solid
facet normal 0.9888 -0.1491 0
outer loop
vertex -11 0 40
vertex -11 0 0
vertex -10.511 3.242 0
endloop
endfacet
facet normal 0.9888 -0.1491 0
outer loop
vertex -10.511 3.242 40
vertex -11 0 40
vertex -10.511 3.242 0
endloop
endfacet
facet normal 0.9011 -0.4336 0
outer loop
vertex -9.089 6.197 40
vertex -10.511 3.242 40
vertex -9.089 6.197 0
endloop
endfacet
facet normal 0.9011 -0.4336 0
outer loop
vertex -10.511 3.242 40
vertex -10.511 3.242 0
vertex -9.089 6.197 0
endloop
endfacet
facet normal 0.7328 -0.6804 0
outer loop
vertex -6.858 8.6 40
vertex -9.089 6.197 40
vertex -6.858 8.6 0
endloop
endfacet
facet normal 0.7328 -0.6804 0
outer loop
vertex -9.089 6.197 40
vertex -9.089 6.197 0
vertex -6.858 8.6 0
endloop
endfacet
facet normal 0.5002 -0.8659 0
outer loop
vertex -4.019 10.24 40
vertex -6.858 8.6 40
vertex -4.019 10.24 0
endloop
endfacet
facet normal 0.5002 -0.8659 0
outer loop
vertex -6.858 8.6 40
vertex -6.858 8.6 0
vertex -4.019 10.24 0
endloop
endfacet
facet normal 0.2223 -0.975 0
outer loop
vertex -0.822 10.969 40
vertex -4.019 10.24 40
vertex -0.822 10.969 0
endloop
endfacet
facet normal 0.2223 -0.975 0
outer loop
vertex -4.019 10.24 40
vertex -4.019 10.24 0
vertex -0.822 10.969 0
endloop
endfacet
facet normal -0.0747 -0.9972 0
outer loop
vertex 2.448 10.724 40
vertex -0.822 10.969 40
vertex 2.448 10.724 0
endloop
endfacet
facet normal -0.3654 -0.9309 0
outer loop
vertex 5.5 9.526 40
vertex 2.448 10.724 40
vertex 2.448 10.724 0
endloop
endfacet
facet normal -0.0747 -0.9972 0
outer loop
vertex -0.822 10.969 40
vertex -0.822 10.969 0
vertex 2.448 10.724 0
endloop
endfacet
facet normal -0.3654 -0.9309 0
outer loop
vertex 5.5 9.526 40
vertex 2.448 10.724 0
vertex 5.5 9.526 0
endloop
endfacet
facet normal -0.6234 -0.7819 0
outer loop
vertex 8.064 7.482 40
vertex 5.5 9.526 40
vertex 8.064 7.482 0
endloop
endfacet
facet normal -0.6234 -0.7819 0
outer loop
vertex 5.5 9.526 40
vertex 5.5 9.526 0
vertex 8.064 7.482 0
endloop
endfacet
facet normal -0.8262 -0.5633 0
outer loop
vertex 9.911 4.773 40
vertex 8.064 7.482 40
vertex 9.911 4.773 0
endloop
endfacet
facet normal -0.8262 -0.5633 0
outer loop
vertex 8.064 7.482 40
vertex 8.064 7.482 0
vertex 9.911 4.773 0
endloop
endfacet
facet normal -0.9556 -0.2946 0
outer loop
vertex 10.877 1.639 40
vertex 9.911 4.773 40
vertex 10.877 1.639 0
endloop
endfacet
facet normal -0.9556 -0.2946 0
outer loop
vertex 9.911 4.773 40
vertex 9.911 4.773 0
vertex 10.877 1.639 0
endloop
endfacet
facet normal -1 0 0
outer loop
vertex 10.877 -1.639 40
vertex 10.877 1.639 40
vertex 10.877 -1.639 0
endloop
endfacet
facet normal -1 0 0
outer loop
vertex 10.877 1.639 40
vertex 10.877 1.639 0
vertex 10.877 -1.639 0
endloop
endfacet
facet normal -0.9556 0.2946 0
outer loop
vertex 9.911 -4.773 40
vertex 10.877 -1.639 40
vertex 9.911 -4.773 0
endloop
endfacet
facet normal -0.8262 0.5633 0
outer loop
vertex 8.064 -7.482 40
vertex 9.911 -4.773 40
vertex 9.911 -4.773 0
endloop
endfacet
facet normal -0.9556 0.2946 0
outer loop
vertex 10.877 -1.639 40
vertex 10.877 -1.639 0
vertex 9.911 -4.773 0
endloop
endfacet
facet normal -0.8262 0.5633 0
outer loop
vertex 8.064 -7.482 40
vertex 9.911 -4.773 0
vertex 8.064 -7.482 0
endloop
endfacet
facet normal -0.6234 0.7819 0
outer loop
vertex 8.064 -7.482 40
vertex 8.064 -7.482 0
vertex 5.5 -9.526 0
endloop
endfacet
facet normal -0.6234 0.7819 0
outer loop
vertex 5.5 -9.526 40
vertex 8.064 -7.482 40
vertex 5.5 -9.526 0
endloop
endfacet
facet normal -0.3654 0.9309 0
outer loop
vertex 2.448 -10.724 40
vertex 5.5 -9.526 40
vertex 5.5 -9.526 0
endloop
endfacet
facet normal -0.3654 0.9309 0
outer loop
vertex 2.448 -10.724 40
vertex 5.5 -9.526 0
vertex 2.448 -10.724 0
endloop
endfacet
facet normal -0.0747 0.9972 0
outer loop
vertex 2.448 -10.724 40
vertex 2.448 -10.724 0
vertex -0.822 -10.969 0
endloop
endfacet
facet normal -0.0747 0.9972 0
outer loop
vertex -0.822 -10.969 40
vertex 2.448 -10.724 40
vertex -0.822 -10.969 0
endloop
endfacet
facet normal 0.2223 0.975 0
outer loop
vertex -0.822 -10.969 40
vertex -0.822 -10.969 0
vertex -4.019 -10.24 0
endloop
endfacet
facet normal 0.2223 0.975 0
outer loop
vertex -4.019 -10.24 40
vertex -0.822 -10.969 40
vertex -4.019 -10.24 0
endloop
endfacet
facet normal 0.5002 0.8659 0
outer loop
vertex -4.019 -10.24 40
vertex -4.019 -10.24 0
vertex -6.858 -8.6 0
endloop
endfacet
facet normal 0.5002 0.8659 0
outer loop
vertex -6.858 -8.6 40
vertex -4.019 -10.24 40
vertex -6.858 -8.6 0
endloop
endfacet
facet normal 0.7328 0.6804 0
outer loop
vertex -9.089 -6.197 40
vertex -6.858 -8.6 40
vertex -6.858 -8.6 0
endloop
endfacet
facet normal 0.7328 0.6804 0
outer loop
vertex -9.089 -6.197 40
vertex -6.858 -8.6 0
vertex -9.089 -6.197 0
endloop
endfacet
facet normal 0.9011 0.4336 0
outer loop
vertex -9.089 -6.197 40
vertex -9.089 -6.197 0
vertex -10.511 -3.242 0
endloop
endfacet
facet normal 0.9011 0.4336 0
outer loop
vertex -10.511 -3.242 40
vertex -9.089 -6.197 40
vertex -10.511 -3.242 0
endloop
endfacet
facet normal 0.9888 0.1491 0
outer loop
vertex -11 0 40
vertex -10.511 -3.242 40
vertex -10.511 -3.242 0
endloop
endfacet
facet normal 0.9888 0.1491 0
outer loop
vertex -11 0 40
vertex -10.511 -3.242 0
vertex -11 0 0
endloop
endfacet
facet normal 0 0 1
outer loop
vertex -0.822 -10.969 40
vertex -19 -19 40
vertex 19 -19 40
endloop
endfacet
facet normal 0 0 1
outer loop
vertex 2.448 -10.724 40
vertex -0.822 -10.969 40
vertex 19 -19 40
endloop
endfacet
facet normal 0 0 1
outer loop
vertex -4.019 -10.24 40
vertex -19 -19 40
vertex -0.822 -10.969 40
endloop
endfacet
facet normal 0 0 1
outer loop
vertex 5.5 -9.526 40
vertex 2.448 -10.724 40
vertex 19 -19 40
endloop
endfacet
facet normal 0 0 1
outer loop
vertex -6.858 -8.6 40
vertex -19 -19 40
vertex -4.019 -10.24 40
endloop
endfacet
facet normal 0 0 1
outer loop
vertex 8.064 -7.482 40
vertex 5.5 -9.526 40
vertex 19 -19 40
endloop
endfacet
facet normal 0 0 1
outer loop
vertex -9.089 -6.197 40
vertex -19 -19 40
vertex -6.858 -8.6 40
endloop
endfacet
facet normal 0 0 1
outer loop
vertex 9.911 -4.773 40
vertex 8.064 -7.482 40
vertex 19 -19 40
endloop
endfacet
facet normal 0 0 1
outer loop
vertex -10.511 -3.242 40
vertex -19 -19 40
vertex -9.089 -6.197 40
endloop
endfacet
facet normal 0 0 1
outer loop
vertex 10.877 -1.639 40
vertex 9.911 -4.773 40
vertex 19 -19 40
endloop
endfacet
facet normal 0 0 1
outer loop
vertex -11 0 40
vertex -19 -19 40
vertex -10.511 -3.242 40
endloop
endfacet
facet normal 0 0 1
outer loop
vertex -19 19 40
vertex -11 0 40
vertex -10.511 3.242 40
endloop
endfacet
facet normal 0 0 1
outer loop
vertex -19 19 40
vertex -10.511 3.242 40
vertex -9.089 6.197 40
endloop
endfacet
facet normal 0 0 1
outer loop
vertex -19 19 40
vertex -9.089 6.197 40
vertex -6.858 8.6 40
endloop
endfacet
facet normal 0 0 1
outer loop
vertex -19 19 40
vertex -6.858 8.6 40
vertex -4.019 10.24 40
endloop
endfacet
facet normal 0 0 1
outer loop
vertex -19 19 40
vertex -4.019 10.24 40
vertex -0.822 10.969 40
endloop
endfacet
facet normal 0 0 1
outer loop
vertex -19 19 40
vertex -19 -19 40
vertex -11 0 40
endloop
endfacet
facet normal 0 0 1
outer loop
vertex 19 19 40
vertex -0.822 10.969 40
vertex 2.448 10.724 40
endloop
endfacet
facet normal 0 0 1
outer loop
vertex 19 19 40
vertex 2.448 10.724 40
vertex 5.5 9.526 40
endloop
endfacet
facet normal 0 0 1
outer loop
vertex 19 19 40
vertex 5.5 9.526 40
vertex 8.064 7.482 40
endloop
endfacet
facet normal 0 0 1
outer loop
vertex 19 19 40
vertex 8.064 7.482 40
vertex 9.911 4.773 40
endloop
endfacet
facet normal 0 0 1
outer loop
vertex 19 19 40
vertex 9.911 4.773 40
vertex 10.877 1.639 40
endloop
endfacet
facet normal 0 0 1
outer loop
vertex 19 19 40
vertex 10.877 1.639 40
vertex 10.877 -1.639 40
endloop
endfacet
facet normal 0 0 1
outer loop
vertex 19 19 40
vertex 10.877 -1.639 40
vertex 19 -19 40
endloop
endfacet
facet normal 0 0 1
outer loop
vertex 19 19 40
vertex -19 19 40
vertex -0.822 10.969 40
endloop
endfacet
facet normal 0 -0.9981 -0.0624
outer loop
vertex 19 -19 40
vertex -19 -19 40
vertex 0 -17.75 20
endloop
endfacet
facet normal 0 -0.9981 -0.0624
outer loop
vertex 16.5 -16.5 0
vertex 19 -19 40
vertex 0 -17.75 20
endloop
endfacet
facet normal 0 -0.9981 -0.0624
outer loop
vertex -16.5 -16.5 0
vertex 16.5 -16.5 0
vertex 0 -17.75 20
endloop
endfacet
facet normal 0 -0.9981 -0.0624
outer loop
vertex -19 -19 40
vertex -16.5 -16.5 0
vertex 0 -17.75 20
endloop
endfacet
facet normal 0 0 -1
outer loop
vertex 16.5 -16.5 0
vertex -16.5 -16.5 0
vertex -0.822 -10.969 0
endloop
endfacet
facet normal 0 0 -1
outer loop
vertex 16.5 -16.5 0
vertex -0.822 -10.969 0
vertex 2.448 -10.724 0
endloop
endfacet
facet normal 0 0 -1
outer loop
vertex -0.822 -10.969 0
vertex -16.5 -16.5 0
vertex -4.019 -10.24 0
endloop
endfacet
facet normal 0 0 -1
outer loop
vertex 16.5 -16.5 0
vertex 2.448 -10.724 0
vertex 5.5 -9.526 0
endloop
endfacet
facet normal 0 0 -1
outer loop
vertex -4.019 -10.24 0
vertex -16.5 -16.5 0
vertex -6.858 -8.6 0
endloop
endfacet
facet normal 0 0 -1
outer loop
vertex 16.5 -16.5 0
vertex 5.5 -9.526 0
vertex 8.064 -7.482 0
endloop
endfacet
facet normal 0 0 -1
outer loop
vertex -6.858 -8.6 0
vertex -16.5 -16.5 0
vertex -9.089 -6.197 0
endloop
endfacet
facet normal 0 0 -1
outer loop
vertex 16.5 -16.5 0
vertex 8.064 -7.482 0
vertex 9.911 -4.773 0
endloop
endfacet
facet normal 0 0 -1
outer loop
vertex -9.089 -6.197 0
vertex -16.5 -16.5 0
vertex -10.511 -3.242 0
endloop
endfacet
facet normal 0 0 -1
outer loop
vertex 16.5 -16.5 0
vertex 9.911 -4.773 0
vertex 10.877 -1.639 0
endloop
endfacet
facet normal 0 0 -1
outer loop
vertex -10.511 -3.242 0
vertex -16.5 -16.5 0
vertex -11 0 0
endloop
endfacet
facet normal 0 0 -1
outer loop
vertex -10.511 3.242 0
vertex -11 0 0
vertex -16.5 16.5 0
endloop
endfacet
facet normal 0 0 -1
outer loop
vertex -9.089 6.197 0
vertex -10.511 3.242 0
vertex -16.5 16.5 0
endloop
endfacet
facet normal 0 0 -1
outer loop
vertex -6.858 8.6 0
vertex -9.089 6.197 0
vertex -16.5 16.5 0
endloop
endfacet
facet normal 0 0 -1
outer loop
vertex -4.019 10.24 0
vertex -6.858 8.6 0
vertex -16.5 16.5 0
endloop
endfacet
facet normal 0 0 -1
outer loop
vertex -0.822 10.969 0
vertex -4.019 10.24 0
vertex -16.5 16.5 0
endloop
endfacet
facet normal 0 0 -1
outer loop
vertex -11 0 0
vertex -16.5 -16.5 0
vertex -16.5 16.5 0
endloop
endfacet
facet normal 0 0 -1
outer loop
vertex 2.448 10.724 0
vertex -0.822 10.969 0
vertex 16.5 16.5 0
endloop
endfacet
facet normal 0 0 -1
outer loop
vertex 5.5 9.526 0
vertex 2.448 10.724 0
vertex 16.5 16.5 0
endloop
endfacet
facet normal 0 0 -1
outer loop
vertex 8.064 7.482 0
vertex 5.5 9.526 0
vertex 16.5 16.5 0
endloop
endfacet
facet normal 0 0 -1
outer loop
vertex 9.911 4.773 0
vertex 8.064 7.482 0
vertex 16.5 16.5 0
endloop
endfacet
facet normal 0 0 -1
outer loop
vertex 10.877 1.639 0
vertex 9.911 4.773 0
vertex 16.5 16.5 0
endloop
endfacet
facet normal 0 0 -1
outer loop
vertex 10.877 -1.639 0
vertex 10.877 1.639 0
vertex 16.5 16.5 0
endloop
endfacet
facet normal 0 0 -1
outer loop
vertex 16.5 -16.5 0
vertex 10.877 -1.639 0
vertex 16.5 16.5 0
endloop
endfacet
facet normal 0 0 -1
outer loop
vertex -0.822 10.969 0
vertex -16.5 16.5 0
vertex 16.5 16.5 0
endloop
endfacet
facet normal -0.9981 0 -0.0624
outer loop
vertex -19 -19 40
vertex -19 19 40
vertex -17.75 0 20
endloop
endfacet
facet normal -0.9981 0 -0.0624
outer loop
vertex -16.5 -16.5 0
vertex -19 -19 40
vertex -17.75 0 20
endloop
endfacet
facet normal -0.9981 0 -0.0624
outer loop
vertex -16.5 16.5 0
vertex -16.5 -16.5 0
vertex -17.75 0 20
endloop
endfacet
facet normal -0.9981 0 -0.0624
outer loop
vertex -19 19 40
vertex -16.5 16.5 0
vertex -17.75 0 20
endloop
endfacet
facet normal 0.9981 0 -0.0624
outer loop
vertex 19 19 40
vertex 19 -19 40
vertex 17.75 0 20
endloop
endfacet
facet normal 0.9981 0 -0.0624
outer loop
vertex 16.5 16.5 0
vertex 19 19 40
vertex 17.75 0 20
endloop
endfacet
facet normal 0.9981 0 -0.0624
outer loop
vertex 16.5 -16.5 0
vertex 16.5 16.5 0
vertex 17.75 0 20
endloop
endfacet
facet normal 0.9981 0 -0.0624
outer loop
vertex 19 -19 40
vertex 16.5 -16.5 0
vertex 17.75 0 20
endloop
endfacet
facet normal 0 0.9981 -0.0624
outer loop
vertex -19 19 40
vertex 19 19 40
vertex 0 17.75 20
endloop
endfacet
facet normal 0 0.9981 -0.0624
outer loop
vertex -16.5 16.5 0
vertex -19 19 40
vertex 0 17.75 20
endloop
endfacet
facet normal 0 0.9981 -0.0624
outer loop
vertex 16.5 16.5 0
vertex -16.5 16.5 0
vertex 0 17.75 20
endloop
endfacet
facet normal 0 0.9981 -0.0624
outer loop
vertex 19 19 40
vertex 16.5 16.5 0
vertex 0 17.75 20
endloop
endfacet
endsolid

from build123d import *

# Parameters (mm, degrees)
F2_W = 38
F2_H = 38
F0_W = 33
F0_H = 33
F5_D = 22


with BuildPart() as f3:
    # F2 (on offset) → F3 section 0
    with BuildSketch(Plane.XY.offset(40)):
        Rectangle(F2_W, F2_H)
    # F0 (on Top) → F3 section 1
    with BuildSketch(Plane.XY):
        Rectangle(F0_W, F0_H)
    loft()

    # F5 (through all)
    with Locations(Plane.XY.offset(40)):
        with Locations((0, 0)):
            Hole(F5_D / 2)


solid = f3.part
